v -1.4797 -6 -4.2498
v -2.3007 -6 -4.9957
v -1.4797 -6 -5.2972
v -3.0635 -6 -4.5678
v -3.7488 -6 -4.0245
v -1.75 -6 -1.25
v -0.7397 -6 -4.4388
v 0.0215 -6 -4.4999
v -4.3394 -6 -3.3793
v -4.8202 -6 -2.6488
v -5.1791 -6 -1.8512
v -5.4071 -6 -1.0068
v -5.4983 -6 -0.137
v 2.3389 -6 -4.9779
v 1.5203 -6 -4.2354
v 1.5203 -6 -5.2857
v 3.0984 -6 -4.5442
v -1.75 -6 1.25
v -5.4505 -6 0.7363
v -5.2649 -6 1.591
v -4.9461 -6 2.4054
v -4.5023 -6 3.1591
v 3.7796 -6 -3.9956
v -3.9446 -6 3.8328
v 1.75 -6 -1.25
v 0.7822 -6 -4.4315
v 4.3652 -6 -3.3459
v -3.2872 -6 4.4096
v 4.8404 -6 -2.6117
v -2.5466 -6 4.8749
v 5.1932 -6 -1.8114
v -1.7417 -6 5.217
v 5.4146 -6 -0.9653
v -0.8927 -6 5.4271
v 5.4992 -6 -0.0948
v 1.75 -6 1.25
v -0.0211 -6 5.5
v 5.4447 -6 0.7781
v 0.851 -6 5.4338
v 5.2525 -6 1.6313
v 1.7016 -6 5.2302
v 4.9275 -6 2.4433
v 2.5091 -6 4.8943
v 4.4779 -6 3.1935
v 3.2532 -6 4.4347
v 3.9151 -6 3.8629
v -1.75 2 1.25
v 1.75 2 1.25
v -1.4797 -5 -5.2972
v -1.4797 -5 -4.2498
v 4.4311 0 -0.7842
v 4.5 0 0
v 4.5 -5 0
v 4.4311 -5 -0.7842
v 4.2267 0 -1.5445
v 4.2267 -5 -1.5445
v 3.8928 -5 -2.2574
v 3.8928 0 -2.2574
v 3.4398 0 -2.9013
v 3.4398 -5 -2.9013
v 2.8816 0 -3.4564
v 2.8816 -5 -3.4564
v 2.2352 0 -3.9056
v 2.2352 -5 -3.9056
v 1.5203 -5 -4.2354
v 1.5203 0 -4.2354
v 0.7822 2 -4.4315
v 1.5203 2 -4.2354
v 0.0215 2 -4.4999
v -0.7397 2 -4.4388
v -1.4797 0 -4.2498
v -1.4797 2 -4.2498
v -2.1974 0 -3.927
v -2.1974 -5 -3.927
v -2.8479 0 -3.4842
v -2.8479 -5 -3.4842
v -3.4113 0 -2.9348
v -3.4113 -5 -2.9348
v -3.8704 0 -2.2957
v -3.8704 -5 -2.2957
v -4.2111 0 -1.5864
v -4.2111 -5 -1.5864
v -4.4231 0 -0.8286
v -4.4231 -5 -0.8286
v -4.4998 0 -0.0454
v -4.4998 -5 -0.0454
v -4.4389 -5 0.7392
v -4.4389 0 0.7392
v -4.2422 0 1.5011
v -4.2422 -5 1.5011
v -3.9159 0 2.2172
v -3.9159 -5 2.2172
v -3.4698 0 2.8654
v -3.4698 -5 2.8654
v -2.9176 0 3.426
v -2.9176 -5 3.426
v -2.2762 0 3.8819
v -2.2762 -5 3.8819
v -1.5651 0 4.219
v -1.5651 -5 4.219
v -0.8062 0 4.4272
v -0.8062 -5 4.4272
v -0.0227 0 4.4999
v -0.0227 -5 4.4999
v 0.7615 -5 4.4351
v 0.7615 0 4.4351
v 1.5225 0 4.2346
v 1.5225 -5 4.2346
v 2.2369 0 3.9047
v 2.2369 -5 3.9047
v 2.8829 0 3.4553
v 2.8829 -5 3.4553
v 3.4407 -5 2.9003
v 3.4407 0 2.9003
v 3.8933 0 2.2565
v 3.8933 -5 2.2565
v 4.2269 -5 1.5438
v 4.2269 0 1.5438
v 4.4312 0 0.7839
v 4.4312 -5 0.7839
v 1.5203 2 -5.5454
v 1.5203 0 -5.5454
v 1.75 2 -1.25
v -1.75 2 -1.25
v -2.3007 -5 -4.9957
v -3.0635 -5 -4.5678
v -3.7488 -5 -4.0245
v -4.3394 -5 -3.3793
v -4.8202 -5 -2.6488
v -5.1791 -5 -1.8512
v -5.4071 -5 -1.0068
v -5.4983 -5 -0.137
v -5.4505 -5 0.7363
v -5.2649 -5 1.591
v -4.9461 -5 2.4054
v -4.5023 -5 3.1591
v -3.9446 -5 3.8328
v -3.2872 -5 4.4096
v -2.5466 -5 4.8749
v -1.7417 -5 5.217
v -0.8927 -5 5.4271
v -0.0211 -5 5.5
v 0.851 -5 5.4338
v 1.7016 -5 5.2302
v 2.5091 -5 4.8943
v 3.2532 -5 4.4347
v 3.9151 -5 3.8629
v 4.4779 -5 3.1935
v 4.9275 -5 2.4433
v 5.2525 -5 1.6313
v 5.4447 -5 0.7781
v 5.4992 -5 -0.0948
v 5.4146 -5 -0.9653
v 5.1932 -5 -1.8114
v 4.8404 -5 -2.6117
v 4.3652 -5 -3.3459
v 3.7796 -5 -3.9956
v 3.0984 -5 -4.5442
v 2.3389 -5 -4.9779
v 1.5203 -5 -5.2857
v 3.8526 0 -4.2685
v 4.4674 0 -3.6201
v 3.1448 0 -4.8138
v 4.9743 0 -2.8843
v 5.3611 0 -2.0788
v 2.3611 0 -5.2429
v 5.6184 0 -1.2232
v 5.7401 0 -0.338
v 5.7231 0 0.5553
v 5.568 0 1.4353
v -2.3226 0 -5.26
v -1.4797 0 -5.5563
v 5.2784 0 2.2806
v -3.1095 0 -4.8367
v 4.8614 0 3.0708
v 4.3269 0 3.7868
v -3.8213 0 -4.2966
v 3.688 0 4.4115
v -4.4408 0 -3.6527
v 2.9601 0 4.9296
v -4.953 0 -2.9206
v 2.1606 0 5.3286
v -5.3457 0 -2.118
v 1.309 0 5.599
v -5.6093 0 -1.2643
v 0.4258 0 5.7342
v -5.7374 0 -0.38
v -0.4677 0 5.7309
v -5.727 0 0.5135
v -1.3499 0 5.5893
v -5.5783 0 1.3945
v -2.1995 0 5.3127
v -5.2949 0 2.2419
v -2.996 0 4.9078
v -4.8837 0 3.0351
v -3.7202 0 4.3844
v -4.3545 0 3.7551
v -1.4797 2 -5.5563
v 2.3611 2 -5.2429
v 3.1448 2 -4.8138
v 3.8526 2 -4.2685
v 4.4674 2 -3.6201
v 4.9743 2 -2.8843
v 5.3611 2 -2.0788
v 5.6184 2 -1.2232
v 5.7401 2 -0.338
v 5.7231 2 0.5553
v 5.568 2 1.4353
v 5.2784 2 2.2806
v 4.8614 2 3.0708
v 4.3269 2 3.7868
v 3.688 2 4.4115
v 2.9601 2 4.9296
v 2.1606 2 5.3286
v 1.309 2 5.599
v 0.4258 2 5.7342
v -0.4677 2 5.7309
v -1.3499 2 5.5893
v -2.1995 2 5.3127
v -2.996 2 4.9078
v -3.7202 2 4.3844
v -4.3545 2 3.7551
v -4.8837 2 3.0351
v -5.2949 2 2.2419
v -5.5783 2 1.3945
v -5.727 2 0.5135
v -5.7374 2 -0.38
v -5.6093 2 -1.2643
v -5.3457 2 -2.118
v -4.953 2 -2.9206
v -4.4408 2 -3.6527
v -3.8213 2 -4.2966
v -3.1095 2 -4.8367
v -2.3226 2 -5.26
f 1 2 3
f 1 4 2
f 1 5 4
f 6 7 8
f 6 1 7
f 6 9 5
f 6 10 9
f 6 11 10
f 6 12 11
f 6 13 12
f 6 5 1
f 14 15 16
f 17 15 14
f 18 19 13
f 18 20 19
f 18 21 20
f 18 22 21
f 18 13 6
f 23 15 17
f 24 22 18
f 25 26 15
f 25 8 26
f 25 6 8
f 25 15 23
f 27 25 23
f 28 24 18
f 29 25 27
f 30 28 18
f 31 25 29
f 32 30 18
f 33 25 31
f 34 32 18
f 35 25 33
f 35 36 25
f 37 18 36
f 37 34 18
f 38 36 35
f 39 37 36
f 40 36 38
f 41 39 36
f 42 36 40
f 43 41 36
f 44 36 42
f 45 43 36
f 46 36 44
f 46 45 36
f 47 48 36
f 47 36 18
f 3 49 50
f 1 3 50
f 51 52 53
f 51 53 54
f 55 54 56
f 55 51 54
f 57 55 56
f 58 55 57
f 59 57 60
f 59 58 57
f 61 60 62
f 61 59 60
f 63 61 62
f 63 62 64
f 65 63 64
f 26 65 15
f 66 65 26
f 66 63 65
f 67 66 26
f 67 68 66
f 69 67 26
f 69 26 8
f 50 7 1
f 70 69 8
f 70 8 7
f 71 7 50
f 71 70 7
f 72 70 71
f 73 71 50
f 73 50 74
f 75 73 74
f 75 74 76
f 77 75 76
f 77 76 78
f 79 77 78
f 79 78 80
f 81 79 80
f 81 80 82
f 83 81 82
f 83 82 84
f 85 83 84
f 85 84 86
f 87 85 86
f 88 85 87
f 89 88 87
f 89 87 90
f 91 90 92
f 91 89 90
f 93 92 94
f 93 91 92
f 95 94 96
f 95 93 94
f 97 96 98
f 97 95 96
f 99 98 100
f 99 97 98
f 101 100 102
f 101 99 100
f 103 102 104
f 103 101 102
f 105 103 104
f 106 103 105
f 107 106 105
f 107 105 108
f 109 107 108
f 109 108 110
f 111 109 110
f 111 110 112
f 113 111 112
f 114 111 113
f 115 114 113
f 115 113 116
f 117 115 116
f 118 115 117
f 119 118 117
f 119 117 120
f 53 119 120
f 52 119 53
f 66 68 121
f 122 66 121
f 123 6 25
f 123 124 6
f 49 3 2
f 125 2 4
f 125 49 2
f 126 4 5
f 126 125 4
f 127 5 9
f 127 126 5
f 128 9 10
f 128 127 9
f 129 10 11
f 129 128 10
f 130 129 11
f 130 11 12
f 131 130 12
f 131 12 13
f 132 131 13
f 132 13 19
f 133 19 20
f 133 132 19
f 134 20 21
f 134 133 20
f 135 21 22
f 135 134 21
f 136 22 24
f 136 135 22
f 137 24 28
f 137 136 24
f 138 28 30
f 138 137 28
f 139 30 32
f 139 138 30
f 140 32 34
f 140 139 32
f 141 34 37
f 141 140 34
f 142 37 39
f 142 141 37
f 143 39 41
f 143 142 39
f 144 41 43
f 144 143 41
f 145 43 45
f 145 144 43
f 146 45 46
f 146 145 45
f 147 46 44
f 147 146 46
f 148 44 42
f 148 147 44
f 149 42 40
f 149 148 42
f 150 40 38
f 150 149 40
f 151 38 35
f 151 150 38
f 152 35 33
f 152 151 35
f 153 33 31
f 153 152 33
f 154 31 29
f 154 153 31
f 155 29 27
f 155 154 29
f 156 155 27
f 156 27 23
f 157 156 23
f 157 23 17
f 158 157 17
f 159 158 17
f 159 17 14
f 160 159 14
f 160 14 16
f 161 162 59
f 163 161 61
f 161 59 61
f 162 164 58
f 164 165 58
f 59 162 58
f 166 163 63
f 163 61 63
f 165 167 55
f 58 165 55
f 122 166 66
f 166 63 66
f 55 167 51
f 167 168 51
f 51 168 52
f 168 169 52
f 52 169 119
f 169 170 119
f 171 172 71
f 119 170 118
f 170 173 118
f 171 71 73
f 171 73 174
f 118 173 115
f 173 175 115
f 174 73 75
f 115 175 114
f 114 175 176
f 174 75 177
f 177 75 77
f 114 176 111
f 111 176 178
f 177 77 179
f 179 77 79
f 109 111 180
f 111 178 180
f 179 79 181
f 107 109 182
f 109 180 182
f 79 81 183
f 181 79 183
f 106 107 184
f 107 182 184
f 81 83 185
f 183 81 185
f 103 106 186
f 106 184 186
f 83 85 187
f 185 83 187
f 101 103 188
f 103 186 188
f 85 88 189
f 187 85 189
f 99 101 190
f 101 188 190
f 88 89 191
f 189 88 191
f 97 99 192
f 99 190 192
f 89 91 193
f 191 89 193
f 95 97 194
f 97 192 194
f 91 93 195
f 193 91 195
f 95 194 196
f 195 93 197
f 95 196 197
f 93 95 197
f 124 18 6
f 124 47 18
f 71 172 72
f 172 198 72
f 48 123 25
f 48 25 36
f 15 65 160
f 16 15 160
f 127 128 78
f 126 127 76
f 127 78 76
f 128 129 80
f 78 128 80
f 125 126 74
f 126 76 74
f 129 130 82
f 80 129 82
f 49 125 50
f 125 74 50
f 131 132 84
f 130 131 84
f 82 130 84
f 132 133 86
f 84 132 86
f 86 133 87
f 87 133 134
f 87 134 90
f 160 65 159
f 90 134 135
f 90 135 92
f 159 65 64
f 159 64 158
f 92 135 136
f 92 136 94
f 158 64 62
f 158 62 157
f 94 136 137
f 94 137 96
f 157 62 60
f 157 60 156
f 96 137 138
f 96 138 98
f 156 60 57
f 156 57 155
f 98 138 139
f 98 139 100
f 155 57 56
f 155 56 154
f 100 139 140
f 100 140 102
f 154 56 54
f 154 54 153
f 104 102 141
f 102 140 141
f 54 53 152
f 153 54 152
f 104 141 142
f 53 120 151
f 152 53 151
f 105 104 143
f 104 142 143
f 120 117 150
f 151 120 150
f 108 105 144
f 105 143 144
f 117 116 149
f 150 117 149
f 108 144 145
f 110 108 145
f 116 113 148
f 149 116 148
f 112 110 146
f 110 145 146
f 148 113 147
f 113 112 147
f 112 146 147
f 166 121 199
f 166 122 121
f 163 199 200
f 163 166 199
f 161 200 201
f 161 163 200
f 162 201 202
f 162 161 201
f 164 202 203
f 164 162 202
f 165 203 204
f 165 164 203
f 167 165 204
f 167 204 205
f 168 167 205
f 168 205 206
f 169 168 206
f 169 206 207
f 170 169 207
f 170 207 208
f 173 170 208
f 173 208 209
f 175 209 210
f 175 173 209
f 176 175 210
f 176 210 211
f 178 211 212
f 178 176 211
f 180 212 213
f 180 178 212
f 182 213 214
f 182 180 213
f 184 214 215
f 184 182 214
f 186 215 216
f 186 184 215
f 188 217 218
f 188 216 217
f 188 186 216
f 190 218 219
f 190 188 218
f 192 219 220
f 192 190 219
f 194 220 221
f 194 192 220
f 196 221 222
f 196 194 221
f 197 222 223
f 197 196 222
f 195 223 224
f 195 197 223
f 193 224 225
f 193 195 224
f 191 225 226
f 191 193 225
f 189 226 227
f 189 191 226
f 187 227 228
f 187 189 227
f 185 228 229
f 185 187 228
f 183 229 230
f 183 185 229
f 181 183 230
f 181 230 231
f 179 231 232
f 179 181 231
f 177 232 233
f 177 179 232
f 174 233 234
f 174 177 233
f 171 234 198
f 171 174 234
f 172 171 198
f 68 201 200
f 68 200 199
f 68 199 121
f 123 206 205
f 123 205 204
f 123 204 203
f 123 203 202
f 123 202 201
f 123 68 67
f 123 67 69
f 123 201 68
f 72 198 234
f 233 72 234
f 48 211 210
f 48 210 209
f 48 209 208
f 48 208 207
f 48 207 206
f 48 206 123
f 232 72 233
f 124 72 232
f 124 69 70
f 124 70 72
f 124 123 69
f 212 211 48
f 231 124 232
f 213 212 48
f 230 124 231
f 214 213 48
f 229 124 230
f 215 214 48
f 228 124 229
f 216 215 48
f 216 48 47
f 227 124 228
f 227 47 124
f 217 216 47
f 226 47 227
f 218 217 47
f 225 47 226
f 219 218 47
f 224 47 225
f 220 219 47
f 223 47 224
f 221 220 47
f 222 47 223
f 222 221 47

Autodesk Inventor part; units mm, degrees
ref_plane "YZ Plane" through (0, 0, 0) normal (1, 0, 0) x (0, 1, 0)
ref_plane "XZ Plane" through (0, 0, 0) normal (0, 1, 0) x (-1, 0, 0)
ref_plane "XY Plane" through (0, 0, 0) normal (0, 0, 1) x (1, 0, 0)
sketch "草圖1" plane through (0, 0, 0) normal (0, 1, 0) x (-1, 0, 0)
  circle A0 centre (0, 0) radius 5.75
  dimension "d0" = 11.5
extrude "擠出1" add sketch "草圖1" along normal blind 2
sketch "草圖2" plane through (0, 0, 0) normal (0, -1, 0) x (1, 0, 0)
  circle A0 centre (0, 0) radius 4.5
  dimension "d3" = 9
extrude "擠出2" add sketch "草圖2" along normal blind 5
sketch "草圖3" plane through (0, -5, 0) normal (0, -1, 0) x (1, 0, 0)
  circle A0 centre (0, 0) radius 5.5
extrude "擠出3" add sketch "草圖3" along normal blind 1
sketch "草圖4" plane through (0, 2, 0) normal (0, 1, 0) x (1, 0, 0)
  line L0 (-1.75, 1.25) -> (1.75, 1.25)
  line L1 (1.75, 1.25) -> (1.75, -1.25)
  line L2 (1.75, -1.25) -> (-1.75, -1.25)
  line L3 (-1.75, -1.25) -> (-1.75, 1.25)
  line L4 (-1.75, 1.25) -> (1.75, -1.25) construction
  line L5 (1.75, 1.25) -> (-1.75, -1.25) construction
  point P0 (0, 0)
  dimension "d8" = 2.5
  dimension "d9" = 3.5
extrude "擠出4" cut sketch "草圖4" against normal through all
sketch "草圖5" plane through (0, 2, 0) normal (0, 1, 0) x (1, 0, 0)
  line L0 (-1.4797, 3) -> (1.5203, 3)
  line L1 (1.5203, 3) -> (1.5203, 6)
  line L2 (1.5203, 6) -> (-1.4797, 6)
  line L3 (-1.4797, 6) -> (-1.4797, 3)
  circle A0 centre (0, 0) radius 4.5 projected
  line L4 (-1.4797, 3) -> (1.5203, 6) construction
  line L5 (1.5203, 3) -> (-1.4797, 6) construction
  point P0 (0.0203, 4.5)
  point P1 (-1.4797, 4.2497)
  point P2 (1.5203, 4.2354)
  dimension "d12" = 3
  dimension "d15" = 3
extrude "擠出5" cut sketch "草圖5" against normal through all contours L3 L2 L1 A0
properties part number "圓形同心線圈內"
